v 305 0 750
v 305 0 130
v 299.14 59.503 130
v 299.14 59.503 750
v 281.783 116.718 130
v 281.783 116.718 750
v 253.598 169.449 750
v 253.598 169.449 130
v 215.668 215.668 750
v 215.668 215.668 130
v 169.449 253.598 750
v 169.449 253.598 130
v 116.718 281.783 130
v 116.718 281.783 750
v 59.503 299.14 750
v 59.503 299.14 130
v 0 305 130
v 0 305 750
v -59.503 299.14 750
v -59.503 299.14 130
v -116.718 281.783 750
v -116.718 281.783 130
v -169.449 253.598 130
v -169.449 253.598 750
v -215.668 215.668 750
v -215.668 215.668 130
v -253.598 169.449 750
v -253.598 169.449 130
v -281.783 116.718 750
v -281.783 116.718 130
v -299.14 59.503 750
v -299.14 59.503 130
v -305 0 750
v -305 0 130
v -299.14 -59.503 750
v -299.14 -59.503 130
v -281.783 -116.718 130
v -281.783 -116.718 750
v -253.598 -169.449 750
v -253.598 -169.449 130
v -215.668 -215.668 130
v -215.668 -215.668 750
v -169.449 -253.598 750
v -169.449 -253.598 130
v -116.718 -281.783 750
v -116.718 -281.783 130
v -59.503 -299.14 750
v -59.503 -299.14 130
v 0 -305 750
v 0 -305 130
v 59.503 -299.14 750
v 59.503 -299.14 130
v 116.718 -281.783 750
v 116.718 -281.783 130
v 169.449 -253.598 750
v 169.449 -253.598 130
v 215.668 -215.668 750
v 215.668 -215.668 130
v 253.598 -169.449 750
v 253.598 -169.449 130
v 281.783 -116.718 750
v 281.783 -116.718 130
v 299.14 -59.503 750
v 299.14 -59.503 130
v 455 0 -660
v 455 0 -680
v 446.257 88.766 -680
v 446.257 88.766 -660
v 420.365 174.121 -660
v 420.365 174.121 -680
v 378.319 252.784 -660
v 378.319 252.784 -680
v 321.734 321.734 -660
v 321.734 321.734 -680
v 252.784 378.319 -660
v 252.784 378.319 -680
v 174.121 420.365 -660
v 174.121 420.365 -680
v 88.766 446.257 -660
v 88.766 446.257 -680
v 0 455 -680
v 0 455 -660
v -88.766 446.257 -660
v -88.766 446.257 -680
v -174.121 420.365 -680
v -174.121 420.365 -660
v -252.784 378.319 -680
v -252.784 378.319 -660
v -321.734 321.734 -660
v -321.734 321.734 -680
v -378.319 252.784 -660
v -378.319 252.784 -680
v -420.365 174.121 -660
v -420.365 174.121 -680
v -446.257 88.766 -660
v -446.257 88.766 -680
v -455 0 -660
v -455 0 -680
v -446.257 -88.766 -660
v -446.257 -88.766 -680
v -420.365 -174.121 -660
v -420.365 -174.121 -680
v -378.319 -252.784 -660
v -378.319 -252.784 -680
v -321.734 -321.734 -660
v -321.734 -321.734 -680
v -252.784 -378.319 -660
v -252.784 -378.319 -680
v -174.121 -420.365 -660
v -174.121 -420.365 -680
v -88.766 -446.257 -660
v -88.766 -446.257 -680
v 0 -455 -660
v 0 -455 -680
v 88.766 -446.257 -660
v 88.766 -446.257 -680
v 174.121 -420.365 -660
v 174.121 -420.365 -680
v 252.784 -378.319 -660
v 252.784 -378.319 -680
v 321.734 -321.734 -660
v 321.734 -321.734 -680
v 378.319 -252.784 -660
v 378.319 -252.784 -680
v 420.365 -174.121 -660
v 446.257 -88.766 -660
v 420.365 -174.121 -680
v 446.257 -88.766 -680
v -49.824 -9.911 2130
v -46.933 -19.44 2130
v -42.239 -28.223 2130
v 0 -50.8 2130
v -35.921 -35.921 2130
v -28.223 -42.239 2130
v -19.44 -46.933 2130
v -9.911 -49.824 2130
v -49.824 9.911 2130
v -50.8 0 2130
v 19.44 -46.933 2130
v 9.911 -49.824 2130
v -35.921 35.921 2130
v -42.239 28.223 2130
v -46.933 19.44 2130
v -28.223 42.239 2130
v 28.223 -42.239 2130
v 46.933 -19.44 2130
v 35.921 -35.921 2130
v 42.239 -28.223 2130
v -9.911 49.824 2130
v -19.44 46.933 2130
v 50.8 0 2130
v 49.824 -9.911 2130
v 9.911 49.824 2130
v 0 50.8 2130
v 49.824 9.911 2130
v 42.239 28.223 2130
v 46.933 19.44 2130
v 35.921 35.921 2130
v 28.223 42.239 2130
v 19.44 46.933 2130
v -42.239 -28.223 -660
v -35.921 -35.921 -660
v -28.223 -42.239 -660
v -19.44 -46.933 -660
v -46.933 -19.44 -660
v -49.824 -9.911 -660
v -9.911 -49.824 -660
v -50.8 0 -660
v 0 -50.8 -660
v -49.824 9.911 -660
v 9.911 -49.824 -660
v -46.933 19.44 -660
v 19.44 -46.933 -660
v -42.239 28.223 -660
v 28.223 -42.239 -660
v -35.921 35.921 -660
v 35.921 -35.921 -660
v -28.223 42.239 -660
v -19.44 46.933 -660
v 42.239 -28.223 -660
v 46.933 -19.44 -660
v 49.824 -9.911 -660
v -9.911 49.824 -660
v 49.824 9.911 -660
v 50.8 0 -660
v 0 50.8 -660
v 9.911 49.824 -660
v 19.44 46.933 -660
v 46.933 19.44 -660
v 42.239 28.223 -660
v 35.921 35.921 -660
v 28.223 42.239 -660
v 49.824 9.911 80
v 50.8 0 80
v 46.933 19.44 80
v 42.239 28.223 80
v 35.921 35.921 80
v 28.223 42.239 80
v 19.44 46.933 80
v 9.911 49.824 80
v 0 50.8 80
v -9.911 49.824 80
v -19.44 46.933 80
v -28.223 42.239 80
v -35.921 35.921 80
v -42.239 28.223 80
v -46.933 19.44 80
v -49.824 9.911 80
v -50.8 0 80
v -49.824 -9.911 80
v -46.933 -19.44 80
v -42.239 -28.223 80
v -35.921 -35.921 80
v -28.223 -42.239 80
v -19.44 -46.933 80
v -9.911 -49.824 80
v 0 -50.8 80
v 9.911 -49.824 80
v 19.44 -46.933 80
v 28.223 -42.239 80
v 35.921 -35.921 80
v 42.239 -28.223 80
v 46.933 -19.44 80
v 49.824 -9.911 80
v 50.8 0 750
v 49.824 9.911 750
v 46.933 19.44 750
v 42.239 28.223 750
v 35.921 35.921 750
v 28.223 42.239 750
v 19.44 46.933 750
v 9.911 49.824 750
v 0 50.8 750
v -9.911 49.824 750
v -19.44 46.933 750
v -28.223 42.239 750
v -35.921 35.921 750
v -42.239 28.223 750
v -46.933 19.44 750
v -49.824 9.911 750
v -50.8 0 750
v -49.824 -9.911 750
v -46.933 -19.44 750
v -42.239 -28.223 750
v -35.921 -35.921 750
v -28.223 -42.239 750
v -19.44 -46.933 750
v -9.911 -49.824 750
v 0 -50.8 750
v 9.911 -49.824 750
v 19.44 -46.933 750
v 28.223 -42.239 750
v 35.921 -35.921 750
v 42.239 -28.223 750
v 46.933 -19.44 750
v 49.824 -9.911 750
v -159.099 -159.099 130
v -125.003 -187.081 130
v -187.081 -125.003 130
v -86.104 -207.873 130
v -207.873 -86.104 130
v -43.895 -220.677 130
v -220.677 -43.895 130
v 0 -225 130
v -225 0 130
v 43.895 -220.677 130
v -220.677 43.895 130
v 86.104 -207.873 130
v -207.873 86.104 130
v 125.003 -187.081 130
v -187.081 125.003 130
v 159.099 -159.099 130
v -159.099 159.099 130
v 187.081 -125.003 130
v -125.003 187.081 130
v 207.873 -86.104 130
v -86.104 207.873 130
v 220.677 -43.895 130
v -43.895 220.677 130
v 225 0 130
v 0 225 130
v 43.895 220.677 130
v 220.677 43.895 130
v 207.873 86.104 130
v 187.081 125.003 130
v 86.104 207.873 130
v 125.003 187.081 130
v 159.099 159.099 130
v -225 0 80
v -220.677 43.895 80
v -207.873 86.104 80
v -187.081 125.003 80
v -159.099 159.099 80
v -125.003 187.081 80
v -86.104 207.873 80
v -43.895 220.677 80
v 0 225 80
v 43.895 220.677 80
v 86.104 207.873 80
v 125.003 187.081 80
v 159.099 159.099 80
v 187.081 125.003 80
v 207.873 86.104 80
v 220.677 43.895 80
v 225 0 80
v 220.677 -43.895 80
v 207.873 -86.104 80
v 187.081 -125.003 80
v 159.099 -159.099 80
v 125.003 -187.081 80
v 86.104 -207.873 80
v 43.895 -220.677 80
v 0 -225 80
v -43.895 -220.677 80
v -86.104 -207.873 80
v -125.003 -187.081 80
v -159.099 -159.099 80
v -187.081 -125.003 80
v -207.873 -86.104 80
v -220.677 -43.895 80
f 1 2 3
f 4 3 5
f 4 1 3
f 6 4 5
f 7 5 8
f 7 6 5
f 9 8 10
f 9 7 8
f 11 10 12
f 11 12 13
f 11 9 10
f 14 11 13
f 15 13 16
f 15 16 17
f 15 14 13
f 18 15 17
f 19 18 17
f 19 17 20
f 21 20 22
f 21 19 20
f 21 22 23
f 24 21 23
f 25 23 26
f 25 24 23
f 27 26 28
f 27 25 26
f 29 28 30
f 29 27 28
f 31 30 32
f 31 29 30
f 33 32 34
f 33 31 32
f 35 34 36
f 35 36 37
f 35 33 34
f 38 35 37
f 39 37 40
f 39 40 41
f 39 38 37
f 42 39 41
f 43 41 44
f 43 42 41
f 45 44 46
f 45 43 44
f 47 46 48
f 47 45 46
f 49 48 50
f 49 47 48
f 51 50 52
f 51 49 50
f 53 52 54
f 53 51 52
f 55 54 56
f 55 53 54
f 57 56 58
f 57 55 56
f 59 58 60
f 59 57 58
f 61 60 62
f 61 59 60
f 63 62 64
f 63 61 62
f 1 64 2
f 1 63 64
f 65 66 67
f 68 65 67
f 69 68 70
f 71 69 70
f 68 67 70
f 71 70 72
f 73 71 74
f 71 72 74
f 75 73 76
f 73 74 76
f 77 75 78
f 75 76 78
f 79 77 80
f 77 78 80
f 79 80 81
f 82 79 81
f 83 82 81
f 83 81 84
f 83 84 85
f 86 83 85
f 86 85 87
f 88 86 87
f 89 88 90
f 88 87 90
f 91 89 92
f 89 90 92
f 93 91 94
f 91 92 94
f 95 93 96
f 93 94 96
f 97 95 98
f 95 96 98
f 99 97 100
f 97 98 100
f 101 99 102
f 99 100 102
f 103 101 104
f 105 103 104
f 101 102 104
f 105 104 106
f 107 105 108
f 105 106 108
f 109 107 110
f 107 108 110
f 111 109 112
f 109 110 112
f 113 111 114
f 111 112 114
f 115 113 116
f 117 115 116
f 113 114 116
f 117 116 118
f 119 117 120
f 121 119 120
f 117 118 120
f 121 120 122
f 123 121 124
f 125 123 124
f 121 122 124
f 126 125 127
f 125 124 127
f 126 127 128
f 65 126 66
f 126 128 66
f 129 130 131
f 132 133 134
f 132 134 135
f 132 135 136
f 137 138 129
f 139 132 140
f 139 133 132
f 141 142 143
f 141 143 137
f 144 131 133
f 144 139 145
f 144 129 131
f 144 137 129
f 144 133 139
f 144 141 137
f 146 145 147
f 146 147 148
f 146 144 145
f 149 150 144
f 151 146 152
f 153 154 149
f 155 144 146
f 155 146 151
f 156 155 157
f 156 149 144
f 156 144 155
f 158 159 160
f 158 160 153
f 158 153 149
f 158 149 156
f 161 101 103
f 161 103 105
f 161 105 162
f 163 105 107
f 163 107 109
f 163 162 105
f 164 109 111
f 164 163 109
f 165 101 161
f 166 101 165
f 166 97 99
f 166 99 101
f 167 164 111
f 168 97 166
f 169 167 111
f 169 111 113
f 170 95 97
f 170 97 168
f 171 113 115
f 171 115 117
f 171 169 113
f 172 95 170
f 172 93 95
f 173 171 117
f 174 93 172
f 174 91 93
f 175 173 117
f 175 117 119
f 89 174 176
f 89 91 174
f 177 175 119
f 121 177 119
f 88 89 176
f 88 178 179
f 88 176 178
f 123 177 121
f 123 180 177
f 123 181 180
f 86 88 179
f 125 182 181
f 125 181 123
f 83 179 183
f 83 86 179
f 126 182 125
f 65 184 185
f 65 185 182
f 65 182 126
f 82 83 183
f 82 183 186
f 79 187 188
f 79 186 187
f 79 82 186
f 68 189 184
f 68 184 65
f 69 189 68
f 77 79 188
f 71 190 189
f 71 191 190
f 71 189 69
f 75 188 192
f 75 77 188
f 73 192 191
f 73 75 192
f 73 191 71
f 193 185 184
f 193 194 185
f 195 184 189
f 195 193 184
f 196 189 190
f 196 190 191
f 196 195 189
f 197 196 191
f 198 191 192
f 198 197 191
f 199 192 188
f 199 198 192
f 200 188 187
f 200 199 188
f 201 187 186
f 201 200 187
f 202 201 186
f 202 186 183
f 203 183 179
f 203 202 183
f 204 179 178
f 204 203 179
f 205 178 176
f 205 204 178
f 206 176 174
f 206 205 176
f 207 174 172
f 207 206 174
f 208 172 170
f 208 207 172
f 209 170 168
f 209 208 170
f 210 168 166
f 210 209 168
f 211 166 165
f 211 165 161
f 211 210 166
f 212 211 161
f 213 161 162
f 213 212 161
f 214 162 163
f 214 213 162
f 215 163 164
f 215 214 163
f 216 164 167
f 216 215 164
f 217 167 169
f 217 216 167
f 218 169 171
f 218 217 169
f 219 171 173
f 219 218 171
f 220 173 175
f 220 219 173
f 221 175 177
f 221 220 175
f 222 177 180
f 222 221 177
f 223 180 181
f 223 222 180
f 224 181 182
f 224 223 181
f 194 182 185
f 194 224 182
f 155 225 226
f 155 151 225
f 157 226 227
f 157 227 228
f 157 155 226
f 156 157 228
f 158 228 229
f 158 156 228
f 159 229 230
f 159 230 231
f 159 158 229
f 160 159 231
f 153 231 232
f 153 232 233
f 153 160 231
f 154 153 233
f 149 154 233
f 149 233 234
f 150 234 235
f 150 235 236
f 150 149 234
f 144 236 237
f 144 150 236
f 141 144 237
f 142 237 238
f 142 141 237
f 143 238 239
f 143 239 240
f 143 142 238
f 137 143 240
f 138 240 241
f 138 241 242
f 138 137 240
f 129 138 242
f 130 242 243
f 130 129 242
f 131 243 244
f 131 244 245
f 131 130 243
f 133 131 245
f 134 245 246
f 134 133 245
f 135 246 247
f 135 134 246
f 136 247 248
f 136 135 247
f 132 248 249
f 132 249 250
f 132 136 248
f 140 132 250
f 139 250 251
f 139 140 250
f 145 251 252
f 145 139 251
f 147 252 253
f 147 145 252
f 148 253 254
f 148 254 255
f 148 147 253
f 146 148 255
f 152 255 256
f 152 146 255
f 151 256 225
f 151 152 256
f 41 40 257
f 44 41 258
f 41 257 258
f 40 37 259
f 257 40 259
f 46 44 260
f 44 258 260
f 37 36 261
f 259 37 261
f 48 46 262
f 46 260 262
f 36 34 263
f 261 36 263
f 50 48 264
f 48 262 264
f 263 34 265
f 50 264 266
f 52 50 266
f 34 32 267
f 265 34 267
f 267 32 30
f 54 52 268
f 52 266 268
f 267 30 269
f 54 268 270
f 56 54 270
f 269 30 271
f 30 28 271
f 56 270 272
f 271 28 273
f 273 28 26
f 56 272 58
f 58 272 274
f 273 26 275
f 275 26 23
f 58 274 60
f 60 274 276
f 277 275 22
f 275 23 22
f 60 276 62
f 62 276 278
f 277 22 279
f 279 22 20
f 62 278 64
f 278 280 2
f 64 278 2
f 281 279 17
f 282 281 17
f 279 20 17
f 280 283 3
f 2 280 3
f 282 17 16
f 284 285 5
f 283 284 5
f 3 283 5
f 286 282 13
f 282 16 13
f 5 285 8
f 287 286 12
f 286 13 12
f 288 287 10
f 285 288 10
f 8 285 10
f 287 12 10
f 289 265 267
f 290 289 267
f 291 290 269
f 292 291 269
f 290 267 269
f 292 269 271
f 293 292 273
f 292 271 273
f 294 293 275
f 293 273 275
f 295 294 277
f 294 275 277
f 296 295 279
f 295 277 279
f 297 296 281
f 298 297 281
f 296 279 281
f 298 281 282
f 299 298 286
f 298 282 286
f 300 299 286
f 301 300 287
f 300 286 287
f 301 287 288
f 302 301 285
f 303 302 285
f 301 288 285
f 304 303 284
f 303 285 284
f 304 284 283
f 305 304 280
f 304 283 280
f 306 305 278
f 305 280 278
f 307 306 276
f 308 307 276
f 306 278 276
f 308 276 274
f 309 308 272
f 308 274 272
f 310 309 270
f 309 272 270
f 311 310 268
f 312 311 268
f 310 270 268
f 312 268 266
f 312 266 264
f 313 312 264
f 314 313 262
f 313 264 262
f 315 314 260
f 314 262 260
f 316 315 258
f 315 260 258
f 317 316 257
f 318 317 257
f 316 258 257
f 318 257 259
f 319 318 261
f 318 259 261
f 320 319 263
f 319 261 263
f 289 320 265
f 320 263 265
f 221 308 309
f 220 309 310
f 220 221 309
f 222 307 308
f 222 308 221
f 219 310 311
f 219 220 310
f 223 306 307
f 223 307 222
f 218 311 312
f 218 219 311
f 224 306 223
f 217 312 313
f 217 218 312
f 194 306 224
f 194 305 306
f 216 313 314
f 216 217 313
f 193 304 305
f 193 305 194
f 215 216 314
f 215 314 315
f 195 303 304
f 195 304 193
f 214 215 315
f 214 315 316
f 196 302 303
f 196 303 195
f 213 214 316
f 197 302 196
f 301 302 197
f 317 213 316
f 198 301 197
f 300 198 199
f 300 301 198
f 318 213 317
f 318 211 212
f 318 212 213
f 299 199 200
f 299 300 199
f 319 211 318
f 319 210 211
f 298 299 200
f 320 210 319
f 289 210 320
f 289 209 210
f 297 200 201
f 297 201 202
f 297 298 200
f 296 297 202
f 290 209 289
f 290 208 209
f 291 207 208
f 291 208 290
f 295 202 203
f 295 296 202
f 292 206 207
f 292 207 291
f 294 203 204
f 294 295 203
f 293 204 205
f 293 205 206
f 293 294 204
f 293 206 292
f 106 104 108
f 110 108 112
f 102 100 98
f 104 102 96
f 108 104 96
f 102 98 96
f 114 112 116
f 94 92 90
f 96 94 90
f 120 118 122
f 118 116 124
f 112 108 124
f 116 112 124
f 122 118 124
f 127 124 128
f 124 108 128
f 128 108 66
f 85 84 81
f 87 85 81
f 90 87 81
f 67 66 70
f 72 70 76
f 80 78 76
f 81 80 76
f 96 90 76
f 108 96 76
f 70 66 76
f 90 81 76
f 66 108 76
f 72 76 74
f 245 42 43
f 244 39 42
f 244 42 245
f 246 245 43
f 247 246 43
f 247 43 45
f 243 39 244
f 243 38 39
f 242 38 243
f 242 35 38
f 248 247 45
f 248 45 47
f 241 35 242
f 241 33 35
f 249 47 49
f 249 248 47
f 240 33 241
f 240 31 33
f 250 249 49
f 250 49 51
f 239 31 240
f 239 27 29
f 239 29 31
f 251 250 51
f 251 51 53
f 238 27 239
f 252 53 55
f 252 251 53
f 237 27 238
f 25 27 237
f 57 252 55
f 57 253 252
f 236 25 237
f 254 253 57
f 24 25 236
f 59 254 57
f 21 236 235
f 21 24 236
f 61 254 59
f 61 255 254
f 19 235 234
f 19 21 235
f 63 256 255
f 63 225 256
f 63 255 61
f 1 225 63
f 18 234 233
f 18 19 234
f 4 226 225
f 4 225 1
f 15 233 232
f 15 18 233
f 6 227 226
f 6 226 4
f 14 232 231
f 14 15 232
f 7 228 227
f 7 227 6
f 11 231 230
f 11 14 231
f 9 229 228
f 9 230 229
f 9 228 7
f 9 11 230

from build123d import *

# Parameters (mm, degrees)
SKETCH1_R                = 50.8
BOSS_EXTRUDE1_DEPTH      = 2130
BOSS_EXTRUDE1_DEPTH_BACK = 680
SKETCH2_R                = 455
BOSS_EXTRUDE2_DEPTH      = 20
BOSS_EXTRUDE3_START      = -1380
SKETCH7_R                = 305
BOSS_EXTRUDE3_DEPTH      = 620
SKETCH8_R                = 225
BOSS_EXTRUDE4_DEPTH      = 50


with BuildPart() as part:
    # Sketch1 → Boss-Extrude1 (new body, two sides)
    with BuildSketch(Plane.XY) as boss_extrude1_sk:
        Circle(SKETCH1_R)
    extrude(amount=BOSS_EXTRUDE1_DEPTH)
    extrude(boss_extrude1_sk.sketch, amount=-BOSS_EXTRUDE1_DEPTH_BACK)

    # Sketch2 → Boss-Extrude2 (add)
    with BuildSketch(Plane.XY.offset(-680)):
        Circle(SKETCH2_R)
    extrude(amount=BOSS_EXTRUDE2_DEPTH)

    # Sketch7 → Boss-Extrude3 (add)
    with BuildSketch(Plane.XY.offset(2130).offset(BOSS_EXTRUDE3_START)):
        Circle(SKETCH7_R)
    extrude(amount=-BOSS_EXTRUDE3_DEPTH)

    # Sketch8 → Boss-Extrude4 (add)
    with BuildSketch(Plane(origin=(0, 0, 130), x_dir=(-1, 0, 0), z_dir=(0, 0, -1))):
        Circle(SKETCH8_R)
    extrude(amount=BOSS_EXTRUDE4_DEPTH)


solid = part.part
